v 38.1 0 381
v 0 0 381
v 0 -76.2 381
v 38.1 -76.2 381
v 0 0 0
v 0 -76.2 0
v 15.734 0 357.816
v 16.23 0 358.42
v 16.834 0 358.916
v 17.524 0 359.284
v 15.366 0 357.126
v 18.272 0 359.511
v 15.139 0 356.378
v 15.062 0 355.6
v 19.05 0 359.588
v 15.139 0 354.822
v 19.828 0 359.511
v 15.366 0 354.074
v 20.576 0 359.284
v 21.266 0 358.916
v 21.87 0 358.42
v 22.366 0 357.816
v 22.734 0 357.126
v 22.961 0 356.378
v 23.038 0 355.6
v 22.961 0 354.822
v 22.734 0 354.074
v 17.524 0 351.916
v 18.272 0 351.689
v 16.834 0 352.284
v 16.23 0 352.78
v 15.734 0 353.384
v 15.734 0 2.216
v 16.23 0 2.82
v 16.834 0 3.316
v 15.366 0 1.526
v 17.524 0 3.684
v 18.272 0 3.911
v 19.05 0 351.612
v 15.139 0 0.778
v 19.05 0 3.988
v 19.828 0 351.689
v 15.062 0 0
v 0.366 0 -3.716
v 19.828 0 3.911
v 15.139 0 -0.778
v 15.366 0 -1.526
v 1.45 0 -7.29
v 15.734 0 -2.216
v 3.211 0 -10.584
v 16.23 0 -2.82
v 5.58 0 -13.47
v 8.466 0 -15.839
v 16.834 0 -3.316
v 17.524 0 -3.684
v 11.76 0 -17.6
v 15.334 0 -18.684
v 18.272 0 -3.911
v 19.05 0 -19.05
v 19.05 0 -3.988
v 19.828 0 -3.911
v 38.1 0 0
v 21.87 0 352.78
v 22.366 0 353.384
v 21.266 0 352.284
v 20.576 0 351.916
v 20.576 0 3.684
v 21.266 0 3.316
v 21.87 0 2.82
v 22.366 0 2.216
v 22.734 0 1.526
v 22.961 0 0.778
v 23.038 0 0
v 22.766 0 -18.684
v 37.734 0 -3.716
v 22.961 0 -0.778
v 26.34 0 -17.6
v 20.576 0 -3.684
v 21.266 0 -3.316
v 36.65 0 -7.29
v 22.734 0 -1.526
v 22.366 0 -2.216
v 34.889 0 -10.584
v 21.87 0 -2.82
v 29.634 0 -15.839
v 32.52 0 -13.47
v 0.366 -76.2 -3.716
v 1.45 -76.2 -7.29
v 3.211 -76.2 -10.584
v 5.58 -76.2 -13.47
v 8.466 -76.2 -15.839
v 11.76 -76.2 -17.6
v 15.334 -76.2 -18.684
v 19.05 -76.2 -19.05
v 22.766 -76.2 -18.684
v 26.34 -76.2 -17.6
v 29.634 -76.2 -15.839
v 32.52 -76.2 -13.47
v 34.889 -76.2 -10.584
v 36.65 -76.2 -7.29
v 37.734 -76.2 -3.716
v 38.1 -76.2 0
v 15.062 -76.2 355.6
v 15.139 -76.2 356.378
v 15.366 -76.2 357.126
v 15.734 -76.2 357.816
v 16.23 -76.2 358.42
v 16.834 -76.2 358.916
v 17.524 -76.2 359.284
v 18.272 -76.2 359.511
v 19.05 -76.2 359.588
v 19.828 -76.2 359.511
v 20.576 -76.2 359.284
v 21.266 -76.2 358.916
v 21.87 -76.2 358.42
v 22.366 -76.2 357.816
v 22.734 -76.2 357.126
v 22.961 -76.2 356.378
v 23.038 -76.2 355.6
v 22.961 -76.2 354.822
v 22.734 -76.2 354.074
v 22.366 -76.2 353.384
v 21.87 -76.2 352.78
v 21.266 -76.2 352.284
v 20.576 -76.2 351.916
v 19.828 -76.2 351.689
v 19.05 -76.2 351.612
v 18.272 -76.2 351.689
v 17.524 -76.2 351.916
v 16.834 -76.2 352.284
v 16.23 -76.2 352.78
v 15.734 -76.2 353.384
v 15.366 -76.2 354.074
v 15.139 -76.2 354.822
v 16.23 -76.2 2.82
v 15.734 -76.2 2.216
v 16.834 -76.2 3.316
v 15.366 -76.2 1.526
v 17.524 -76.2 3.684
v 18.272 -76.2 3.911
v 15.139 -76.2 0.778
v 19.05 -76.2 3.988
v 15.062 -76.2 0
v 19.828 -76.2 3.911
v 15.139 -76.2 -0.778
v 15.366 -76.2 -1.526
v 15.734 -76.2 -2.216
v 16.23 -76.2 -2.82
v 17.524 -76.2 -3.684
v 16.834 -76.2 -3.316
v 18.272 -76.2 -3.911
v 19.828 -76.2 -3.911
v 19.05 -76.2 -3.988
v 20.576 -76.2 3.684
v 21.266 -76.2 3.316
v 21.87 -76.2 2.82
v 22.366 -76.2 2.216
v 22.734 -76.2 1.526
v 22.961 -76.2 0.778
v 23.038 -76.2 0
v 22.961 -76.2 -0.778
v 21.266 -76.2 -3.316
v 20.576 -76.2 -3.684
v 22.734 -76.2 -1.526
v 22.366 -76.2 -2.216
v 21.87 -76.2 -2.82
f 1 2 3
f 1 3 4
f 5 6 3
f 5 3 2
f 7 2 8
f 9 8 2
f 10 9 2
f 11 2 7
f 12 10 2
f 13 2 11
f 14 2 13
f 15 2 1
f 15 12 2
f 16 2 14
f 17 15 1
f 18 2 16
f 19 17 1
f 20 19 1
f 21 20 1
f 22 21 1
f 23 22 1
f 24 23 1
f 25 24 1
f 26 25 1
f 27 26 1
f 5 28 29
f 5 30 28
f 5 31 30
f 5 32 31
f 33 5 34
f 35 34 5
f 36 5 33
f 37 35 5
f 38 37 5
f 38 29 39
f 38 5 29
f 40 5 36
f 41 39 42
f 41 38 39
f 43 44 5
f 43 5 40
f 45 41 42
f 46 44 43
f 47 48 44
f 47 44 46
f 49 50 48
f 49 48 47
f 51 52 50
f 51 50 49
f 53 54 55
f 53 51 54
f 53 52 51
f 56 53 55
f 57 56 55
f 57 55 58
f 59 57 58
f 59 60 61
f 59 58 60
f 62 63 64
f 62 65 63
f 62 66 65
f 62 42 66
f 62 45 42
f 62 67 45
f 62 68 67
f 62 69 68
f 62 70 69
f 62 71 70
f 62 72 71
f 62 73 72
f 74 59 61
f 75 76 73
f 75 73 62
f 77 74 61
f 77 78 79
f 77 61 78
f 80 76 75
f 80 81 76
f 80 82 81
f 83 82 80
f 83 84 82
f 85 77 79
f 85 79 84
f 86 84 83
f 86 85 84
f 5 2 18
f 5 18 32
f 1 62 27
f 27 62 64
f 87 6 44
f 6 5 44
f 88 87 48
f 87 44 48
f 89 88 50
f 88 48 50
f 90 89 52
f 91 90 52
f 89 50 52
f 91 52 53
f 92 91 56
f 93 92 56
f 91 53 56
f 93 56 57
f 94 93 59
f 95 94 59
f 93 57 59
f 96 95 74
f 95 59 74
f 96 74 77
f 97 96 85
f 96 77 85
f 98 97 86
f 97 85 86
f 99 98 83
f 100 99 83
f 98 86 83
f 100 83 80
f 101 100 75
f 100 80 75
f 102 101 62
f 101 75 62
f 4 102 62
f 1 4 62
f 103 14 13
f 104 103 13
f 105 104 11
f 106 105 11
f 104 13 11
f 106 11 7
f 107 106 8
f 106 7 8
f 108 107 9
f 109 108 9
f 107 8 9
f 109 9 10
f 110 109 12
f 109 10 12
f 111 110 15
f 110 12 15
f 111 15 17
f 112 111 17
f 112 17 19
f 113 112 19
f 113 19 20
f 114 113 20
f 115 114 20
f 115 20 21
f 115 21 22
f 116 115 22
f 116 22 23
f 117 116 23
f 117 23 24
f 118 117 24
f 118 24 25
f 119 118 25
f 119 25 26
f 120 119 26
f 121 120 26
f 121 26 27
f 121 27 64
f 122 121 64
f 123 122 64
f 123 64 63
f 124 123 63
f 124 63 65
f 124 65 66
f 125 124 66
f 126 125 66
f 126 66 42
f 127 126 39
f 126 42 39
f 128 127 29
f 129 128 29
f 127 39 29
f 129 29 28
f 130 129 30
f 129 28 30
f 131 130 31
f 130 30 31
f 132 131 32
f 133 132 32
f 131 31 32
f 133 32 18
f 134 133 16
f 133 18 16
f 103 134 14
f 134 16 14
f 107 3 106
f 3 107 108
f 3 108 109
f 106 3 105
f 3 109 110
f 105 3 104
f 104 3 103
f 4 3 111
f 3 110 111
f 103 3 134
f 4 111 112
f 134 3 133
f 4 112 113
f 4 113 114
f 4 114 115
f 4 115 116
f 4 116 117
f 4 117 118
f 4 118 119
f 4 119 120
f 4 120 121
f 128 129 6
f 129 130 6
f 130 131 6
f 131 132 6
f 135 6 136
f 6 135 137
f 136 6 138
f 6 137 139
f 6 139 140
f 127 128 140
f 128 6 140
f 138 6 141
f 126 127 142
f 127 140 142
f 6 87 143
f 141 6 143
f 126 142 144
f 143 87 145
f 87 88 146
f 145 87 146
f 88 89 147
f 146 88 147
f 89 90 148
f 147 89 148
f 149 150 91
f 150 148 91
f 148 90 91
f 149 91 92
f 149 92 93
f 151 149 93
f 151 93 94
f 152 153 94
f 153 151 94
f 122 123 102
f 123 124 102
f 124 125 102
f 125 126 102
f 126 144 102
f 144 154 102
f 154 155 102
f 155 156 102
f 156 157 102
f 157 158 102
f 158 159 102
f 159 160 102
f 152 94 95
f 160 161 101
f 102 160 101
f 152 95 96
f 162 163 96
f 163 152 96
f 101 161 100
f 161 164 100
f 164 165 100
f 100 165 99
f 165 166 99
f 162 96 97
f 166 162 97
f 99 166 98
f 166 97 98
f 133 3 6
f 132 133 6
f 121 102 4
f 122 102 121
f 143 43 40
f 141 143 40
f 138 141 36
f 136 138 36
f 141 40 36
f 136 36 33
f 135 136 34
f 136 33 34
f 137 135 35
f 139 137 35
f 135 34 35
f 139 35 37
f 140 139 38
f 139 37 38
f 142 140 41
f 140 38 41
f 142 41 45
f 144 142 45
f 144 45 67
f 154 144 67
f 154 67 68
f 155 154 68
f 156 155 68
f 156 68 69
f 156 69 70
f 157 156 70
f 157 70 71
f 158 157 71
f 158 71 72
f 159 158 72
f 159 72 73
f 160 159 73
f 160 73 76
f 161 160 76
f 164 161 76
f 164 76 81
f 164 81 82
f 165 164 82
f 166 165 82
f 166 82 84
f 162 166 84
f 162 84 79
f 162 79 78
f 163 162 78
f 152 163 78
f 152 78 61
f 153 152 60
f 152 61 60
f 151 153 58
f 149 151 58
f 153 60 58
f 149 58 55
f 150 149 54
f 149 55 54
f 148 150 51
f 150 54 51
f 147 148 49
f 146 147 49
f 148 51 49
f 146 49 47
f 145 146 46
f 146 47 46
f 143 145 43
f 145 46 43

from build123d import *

# Parameters (mm, degrees)
SKETCH1_W           = 19.05
SKETCH1_H           = 76.2
REVOLVE1_ANGLE      = 180
SKETCH2_W           = 38.1
SKETCH2_H           = 76.2
BOSS_EXTRUDE1_DEPTH = 381
SKETCH3_R           = 3.9878
CUT_EXTRUDE1_DEPTH  = 391.408824183
SKETCH4_R           = 3.9878
CUT_EXTRUDE2_DEPTH  = 391.408824183


with BuildPart() as part:
    # Sketch1 → Revolve1 (revolve)
    with BuildSketch(Plane.XY):
        with Locations((9.525, -38.1)):
            Rectangle(SKETCH1_W, SKETCH1_H)
    revolve(axis=Axis((19.05, 0, 0), (0, -1, 0)), revolution_arc=REVOLVE1_ANGLE)

    # Sketch2 → Boss-Extrude1 (add)
    with BuildSketch(Plane.XY):
        with Locations((19.05, -38.1)):
            Rectangle(SKETCH2_W, SKETCH2_H)
    extrude(amount=BOSS_EXTRUDE1_DEPTH)

    # Sketch3 → Cut-Extrude1 (cut, through all)
    with BuildSketch(Plane(origin=(0, 0, 0), x_dir=(1, 0, 0), z_dir=(0, 1, 0))):
        with Locations(Location((19.05, 0, 0), (0, 0, 180))):
            Circle(SKETCH3_R)
    extrude(amount=-CUT_EXTRUDE1_DEPTH, mode=Mode.SUBTRACT)

    # Sketch4 → Cut-Extrude2 (cut, through all)
    with BuildSketch(Plane(origin=(0, 0, 0), x_dir=(1, 0, 0), z_dir=(0, 1, 0))):
        with Locations(Location((19.05, -355.6, 0), (0, 0, 180))):
            Circle(SKETCH4_R)
    extrude(amount=-CUT_EXTRUDE2_DEPTH, mode=Mode.SUBTRACT)


solid = part.part
